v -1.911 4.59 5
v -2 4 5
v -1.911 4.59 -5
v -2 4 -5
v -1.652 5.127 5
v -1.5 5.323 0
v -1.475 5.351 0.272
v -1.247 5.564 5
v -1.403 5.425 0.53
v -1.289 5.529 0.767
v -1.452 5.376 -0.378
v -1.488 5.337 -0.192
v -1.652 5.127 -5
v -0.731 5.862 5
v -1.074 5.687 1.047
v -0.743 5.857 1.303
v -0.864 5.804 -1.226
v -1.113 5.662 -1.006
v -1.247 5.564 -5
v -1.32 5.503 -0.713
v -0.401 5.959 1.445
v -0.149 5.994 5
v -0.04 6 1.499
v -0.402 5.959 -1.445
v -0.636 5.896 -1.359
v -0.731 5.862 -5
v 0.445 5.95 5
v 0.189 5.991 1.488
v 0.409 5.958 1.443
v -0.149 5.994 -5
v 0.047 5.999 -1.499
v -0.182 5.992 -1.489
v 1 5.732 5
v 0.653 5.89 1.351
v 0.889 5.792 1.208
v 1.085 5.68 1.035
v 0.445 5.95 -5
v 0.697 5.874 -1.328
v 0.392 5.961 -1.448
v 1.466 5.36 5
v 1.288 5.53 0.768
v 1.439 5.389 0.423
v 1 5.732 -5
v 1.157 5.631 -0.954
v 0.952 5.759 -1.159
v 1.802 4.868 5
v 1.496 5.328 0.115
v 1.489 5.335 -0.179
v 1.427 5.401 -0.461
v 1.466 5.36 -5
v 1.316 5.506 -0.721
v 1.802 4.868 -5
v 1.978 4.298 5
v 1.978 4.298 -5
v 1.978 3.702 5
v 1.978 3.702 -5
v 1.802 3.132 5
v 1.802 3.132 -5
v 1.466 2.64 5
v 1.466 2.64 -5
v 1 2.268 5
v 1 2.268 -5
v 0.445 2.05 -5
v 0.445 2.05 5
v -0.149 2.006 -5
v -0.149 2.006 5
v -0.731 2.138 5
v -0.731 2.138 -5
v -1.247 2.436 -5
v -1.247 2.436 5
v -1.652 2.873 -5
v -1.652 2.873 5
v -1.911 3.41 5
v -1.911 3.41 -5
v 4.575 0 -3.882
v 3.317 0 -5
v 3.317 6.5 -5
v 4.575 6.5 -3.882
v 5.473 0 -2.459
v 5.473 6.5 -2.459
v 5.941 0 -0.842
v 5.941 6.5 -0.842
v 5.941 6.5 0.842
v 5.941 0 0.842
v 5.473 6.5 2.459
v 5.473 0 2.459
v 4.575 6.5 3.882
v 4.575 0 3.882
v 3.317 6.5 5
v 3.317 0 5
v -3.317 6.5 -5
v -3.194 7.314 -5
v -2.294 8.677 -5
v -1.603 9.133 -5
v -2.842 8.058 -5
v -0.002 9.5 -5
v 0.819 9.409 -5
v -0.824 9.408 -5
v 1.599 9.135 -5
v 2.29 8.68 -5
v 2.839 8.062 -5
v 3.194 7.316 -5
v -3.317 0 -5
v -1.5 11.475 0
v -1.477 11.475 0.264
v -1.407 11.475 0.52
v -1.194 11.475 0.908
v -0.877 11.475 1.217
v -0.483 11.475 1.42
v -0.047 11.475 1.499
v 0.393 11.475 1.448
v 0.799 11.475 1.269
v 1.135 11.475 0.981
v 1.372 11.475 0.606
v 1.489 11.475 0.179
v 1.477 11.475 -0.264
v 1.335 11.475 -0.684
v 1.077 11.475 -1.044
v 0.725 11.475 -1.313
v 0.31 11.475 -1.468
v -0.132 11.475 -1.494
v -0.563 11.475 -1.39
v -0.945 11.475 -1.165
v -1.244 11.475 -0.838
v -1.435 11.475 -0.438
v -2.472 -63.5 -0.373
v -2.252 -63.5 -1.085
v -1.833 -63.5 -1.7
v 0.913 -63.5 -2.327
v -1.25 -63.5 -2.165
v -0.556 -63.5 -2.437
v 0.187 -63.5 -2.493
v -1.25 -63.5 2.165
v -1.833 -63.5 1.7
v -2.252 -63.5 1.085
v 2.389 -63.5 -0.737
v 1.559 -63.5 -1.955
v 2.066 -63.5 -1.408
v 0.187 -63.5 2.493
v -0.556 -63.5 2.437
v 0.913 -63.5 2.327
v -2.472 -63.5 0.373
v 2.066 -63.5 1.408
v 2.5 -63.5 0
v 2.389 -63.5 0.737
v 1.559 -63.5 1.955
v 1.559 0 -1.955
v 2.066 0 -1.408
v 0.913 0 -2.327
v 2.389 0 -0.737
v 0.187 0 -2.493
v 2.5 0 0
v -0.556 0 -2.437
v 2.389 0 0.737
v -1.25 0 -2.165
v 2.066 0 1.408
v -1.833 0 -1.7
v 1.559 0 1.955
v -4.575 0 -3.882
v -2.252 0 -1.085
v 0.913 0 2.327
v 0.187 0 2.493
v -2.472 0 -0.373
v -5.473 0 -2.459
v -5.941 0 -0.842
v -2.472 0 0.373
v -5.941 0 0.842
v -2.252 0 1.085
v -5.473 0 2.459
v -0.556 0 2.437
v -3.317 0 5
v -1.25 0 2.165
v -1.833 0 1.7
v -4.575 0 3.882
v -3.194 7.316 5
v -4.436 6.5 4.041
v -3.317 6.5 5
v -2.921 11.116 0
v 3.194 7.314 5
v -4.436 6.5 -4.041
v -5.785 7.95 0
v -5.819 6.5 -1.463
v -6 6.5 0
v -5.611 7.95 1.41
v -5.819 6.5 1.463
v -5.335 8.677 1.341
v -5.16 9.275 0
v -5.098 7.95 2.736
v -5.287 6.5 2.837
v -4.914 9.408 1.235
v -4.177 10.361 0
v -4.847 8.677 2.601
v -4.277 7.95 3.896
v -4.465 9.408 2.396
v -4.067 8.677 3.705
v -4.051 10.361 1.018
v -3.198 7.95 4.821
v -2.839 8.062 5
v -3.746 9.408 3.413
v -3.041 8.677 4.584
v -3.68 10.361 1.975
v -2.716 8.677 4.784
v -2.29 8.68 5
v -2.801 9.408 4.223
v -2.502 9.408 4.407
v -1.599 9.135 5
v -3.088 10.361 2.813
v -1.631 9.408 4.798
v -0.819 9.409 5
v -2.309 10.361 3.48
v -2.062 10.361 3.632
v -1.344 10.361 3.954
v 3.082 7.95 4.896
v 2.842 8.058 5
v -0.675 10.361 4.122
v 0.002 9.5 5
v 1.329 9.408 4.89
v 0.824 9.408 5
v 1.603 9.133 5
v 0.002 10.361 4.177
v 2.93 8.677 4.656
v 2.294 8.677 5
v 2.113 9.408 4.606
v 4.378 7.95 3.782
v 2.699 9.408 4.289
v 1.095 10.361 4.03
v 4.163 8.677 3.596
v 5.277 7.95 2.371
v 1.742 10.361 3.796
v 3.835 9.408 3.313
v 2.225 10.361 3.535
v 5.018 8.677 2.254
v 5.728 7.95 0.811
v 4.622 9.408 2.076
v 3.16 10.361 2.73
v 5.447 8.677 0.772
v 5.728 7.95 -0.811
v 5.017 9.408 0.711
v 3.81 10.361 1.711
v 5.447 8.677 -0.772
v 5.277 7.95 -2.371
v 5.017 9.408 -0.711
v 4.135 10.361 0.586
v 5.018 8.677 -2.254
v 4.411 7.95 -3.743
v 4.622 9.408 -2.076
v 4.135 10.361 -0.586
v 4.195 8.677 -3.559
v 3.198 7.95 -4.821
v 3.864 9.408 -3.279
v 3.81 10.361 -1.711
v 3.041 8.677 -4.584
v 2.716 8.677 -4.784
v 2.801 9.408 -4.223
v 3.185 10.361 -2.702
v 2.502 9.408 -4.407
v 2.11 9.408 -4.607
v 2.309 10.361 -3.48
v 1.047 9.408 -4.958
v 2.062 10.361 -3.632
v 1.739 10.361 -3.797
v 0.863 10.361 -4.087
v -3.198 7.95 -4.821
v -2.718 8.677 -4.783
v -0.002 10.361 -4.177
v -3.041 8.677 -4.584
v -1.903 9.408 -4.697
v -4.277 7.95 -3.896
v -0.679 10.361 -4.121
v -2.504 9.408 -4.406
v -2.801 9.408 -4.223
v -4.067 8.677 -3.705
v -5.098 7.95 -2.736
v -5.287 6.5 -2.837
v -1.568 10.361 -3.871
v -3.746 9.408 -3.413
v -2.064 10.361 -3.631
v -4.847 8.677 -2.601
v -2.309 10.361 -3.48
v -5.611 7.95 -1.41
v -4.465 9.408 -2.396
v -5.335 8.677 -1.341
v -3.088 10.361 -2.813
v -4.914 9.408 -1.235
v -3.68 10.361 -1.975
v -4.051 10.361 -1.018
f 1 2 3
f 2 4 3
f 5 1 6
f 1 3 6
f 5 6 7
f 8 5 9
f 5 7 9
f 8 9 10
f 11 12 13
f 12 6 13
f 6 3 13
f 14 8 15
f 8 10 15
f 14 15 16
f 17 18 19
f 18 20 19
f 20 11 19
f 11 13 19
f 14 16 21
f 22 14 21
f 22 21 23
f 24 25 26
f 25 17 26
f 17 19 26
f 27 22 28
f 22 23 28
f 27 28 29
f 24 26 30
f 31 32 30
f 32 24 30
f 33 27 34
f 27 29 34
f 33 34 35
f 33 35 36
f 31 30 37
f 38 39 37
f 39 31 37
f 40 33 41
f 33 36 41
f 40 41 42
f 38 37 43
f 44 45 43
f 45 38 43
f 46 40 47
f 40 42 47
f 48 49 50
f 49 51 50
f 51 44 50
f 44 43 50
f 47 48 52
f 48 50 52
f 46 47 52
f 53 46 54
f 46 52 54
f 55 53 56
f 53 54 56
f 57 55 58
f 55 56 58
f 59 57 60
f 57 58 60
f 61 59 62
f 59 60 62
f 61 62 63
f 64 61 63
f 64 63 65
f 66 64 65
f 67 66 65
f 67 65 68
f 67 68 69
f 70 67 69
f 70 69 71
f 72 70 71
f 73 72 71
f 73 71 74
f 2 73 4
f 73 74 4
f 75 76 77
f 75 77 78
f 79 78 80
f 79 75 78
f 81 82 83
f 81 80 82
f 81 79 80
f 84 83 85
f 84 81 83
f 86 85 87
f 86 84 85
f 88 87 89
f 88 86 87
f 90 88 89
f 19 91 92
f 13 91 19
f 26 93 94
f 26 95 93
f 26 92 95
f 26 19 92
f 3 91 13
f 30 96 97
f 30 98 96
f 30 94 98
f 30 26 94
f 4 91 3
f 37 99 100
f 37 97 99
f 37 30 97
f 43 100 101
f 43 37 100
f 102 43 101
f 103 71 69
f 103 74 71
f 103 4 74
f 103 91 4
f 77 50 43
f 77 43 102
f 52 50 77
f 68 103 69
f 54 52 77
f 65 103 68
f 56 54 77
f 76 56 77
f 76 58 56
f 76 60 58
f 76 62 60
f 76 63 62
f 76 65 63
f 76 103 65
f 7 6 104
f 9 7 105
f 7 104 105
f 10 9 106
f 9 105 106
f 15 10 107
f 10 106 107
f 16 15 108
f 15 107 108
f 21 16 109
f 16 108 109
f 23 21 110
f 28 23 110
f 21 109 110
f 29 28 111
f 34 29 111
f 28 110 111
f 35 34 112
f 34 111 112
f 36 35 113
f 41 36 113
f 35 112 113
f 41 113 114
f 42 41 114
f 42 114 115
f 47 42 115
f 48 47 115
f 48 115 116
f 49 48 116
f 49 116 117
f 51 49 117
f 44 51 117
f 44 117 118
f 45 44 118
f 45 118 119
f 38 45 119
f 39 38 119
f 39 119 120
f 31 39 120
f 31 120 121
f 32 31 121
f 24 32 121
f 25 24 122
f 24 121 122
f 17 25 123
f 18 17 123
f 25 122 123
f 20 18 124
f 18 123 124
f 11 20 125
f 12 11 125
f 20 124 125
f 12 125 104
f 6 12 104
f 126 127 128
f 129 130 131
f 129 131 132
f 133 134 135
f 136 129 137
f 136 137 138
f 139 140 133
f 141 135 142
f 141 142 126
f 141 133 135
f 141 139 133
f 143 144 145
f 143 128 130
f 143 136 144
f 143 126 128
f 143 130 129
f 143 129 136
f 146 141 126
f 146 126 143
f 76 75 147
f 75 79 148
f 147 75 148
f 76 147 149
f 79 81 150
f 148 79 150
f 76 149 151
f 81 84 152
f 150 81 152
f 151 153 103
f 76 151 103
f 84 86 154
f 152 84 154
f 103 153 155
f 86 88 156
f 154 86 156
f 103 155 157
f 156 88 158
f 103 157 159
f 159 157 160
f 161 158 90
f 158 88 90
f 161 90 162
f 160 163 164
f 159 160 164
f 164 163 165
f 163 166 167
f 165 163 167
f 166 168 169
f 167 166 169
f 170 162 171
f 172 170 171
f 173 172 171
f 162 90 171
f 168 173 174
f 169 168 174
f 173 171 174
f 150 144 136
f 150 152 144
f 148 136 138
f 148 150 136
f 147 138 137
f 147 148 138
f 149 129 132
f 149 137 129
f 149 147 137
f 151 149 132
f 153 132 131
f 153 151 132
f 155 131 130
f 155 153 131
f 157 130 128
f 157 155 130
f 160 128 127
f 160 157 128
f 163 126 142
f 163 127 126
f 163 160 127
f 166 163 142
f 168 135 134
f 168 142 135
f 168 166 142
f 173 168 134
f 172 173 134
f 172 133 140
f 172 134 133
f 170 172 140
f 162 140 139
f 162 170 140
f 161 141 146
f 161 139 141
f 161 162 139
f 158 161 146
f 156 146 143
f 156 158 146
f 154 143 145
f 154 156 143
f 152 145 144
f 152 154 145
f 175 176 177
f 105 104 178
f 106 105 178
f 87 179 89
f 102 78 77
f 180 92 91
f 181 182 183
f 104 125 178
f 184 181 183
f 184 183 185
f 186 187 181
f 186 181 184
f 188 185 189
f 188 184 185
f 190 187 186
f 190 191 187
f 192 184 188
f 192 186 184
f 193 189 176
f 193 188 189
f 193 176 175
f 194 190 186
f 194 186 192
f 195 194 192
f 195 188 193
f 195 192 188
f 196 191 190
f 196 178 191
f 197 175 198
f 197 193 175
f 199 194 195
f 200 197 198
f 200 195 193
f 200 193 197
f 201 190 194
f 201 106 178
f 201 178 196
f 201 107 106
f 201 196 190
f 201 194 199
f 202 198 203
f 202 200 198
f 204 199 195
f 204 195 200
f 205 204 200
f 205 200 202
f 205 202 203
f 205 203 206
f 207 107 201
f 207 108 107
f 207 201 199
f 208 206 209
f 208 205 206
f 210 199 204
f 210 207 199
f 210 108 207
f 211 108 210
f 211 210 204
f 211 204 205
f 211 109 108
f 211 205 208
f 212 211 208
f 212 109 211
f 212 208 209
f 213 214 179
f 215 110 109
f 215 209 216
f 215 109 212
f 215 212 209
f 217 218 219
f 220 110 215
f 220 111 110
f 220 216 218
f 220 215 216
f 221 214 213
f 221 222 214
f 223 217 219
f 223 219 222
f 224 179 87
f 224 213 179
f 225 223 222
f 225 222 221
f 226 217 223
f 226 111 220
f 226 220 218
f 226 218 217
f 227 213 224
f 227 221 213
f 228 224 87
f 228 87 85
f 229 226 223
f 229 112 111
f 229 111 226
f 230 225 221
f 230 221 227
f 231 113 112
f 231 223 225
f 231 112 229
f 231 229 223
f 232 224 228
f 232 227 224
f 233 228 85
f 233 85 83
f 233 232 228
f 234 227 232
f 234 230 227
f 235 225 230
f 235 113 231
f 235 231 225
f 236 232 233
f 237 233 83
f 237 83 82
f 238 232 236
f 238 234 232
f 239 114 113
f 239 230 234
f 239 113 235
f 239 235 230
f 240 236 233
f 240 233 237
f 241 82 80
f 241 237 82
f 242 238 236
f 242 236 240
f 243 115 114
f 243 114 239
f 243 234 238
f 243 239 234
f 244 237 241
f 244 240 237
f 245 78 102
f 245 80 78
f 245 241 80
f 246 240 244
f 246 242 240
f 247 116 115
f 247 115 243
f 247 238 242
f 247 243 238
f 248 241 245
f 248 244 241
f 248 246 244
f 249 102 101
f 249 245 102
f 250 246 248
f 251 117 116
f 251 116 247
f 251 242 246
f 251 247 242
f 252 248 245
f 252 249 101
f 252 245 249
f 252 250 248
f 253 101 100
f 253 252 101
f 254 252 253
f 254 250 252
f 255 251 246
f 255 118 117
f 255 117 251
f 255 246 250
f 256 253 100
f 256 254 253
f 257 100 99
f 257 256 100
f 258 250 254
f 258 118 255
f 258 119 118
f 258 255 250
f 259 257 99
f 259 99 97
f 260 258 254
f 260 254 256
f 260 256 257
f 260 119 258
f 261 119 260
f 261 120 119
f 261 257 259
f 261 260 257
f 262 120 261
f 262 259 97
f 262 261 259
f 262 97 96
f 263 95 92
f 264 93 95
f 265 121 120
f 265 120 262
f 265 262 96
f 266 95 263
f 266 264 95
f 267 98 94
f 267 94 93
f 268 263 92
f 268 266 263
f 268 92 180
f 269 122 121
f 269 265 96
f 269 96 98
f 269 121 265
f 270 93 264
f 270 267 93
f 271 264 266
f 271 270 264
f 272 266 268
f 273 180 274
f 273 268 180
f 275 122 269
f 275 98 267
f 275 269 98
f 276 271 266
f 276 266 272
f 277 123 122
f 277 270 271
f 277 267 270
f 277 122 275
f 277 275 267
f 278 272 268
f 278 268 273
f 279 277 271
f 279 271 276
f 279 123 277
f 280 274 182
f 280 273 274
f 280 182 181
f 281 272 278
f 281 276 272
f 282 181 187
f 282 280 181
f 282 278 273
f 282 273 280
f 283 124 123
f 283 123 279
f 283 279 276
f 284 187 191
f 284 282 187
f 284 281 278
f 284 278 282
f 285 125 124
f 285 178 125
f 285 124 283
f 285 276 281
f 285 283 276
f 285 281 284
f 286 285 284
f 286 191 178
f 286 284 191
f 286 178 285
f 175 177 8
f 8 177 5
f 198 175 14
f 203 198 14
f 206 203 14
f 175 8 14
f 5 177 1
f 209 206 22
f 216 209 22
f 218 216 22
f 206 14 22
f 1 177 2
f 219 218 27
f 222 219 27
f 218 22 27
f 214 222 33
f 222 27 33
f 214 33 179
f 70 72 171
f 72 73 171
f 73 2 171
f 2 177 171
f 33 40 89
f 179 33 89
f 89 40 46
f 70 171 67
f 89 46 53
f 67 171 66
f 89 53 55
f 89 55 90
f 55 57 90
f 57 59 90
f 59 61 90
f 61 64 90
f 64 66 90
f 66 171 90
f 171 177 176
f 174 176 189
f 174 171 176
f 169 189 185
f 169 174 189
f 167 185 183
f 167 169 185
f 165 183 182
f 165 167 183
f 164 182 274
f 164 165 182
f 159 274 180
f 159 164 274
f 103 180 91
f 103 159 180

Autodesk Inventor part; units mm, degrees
ref_plane "YZ Plane" through (0, 0, 0) normal (1, 0, 0) x (0, 1, 0)
ref_plane "XY Plane" through (0, 0, 0) normal (0, 0, 1) x (1, 0, 0)
sketch "Sketch1" plane through (0, 0, 0) normal (0, 1, 0) x (-1, 0, 0)
  circle A0 centre (0, 0) radius 6
  dimension "d0" = 12
extrude "Extrusion1" add sketch "Sketch1" along normal blind 11.5
fillet "Fillet1" radius 5 1 edges at (6, 11.5, 0)
sketch "Sketch2" plane through (0, 0, 0) normal (0, -1, 0) x (1, 0, 0)
  circle A0 centre (0, 0) radius 2.5
  dimension "d4" = 5
extrude "Extrusion2" add sketch "Sketch2" along normal blind 63.5
sketch "Sketch3" plane through (0, 0, 0) normal (0, -1, 0) x (1, 0, 0)
  circle A0 centre (0, 0) radius 2.5 construction
  line L0 (0, -5) -> (0, 5) construction
  circle A1 centre (0, 0) radius 6 projected
  line L1 (-3.3166, -5) -> (3.3166, -5)
  line L2 (-3.3166, 5) -> (3.3166, 5)
  dimension "d8" = 10
extrude "Extrusion3" cut sketch "Sketch3" against normal through all contours L2 A1 | A1 L1
sketch "Sketch4" plane through (3.3166, 0, -5) normal (0, 0, -1) x (-1, 0, 0)
  line L0 (3.3166, 0) -> (3.3166, 4) construction
  circle A0 centre (3.3166, 4) radius 2
  dimension "d11" = 4
extrude "Extrusion4" cut sketch "Sketch4" against normal through all
ref_plane "Work Plane1" through (0, 11.5, 0) normal (0, 1, 0) x (-1, 0, 0)
sketch "Sketch5" plane through (0, 11.5, 0) normal (0, 1, 0) x (-1, 0, 0)
  circle A0 centre (0, 0) radius 1.5
extrude "Extrusion5" cut sketch "Sketch5" against normal up to surface
properties part number "Asta cassetto"
